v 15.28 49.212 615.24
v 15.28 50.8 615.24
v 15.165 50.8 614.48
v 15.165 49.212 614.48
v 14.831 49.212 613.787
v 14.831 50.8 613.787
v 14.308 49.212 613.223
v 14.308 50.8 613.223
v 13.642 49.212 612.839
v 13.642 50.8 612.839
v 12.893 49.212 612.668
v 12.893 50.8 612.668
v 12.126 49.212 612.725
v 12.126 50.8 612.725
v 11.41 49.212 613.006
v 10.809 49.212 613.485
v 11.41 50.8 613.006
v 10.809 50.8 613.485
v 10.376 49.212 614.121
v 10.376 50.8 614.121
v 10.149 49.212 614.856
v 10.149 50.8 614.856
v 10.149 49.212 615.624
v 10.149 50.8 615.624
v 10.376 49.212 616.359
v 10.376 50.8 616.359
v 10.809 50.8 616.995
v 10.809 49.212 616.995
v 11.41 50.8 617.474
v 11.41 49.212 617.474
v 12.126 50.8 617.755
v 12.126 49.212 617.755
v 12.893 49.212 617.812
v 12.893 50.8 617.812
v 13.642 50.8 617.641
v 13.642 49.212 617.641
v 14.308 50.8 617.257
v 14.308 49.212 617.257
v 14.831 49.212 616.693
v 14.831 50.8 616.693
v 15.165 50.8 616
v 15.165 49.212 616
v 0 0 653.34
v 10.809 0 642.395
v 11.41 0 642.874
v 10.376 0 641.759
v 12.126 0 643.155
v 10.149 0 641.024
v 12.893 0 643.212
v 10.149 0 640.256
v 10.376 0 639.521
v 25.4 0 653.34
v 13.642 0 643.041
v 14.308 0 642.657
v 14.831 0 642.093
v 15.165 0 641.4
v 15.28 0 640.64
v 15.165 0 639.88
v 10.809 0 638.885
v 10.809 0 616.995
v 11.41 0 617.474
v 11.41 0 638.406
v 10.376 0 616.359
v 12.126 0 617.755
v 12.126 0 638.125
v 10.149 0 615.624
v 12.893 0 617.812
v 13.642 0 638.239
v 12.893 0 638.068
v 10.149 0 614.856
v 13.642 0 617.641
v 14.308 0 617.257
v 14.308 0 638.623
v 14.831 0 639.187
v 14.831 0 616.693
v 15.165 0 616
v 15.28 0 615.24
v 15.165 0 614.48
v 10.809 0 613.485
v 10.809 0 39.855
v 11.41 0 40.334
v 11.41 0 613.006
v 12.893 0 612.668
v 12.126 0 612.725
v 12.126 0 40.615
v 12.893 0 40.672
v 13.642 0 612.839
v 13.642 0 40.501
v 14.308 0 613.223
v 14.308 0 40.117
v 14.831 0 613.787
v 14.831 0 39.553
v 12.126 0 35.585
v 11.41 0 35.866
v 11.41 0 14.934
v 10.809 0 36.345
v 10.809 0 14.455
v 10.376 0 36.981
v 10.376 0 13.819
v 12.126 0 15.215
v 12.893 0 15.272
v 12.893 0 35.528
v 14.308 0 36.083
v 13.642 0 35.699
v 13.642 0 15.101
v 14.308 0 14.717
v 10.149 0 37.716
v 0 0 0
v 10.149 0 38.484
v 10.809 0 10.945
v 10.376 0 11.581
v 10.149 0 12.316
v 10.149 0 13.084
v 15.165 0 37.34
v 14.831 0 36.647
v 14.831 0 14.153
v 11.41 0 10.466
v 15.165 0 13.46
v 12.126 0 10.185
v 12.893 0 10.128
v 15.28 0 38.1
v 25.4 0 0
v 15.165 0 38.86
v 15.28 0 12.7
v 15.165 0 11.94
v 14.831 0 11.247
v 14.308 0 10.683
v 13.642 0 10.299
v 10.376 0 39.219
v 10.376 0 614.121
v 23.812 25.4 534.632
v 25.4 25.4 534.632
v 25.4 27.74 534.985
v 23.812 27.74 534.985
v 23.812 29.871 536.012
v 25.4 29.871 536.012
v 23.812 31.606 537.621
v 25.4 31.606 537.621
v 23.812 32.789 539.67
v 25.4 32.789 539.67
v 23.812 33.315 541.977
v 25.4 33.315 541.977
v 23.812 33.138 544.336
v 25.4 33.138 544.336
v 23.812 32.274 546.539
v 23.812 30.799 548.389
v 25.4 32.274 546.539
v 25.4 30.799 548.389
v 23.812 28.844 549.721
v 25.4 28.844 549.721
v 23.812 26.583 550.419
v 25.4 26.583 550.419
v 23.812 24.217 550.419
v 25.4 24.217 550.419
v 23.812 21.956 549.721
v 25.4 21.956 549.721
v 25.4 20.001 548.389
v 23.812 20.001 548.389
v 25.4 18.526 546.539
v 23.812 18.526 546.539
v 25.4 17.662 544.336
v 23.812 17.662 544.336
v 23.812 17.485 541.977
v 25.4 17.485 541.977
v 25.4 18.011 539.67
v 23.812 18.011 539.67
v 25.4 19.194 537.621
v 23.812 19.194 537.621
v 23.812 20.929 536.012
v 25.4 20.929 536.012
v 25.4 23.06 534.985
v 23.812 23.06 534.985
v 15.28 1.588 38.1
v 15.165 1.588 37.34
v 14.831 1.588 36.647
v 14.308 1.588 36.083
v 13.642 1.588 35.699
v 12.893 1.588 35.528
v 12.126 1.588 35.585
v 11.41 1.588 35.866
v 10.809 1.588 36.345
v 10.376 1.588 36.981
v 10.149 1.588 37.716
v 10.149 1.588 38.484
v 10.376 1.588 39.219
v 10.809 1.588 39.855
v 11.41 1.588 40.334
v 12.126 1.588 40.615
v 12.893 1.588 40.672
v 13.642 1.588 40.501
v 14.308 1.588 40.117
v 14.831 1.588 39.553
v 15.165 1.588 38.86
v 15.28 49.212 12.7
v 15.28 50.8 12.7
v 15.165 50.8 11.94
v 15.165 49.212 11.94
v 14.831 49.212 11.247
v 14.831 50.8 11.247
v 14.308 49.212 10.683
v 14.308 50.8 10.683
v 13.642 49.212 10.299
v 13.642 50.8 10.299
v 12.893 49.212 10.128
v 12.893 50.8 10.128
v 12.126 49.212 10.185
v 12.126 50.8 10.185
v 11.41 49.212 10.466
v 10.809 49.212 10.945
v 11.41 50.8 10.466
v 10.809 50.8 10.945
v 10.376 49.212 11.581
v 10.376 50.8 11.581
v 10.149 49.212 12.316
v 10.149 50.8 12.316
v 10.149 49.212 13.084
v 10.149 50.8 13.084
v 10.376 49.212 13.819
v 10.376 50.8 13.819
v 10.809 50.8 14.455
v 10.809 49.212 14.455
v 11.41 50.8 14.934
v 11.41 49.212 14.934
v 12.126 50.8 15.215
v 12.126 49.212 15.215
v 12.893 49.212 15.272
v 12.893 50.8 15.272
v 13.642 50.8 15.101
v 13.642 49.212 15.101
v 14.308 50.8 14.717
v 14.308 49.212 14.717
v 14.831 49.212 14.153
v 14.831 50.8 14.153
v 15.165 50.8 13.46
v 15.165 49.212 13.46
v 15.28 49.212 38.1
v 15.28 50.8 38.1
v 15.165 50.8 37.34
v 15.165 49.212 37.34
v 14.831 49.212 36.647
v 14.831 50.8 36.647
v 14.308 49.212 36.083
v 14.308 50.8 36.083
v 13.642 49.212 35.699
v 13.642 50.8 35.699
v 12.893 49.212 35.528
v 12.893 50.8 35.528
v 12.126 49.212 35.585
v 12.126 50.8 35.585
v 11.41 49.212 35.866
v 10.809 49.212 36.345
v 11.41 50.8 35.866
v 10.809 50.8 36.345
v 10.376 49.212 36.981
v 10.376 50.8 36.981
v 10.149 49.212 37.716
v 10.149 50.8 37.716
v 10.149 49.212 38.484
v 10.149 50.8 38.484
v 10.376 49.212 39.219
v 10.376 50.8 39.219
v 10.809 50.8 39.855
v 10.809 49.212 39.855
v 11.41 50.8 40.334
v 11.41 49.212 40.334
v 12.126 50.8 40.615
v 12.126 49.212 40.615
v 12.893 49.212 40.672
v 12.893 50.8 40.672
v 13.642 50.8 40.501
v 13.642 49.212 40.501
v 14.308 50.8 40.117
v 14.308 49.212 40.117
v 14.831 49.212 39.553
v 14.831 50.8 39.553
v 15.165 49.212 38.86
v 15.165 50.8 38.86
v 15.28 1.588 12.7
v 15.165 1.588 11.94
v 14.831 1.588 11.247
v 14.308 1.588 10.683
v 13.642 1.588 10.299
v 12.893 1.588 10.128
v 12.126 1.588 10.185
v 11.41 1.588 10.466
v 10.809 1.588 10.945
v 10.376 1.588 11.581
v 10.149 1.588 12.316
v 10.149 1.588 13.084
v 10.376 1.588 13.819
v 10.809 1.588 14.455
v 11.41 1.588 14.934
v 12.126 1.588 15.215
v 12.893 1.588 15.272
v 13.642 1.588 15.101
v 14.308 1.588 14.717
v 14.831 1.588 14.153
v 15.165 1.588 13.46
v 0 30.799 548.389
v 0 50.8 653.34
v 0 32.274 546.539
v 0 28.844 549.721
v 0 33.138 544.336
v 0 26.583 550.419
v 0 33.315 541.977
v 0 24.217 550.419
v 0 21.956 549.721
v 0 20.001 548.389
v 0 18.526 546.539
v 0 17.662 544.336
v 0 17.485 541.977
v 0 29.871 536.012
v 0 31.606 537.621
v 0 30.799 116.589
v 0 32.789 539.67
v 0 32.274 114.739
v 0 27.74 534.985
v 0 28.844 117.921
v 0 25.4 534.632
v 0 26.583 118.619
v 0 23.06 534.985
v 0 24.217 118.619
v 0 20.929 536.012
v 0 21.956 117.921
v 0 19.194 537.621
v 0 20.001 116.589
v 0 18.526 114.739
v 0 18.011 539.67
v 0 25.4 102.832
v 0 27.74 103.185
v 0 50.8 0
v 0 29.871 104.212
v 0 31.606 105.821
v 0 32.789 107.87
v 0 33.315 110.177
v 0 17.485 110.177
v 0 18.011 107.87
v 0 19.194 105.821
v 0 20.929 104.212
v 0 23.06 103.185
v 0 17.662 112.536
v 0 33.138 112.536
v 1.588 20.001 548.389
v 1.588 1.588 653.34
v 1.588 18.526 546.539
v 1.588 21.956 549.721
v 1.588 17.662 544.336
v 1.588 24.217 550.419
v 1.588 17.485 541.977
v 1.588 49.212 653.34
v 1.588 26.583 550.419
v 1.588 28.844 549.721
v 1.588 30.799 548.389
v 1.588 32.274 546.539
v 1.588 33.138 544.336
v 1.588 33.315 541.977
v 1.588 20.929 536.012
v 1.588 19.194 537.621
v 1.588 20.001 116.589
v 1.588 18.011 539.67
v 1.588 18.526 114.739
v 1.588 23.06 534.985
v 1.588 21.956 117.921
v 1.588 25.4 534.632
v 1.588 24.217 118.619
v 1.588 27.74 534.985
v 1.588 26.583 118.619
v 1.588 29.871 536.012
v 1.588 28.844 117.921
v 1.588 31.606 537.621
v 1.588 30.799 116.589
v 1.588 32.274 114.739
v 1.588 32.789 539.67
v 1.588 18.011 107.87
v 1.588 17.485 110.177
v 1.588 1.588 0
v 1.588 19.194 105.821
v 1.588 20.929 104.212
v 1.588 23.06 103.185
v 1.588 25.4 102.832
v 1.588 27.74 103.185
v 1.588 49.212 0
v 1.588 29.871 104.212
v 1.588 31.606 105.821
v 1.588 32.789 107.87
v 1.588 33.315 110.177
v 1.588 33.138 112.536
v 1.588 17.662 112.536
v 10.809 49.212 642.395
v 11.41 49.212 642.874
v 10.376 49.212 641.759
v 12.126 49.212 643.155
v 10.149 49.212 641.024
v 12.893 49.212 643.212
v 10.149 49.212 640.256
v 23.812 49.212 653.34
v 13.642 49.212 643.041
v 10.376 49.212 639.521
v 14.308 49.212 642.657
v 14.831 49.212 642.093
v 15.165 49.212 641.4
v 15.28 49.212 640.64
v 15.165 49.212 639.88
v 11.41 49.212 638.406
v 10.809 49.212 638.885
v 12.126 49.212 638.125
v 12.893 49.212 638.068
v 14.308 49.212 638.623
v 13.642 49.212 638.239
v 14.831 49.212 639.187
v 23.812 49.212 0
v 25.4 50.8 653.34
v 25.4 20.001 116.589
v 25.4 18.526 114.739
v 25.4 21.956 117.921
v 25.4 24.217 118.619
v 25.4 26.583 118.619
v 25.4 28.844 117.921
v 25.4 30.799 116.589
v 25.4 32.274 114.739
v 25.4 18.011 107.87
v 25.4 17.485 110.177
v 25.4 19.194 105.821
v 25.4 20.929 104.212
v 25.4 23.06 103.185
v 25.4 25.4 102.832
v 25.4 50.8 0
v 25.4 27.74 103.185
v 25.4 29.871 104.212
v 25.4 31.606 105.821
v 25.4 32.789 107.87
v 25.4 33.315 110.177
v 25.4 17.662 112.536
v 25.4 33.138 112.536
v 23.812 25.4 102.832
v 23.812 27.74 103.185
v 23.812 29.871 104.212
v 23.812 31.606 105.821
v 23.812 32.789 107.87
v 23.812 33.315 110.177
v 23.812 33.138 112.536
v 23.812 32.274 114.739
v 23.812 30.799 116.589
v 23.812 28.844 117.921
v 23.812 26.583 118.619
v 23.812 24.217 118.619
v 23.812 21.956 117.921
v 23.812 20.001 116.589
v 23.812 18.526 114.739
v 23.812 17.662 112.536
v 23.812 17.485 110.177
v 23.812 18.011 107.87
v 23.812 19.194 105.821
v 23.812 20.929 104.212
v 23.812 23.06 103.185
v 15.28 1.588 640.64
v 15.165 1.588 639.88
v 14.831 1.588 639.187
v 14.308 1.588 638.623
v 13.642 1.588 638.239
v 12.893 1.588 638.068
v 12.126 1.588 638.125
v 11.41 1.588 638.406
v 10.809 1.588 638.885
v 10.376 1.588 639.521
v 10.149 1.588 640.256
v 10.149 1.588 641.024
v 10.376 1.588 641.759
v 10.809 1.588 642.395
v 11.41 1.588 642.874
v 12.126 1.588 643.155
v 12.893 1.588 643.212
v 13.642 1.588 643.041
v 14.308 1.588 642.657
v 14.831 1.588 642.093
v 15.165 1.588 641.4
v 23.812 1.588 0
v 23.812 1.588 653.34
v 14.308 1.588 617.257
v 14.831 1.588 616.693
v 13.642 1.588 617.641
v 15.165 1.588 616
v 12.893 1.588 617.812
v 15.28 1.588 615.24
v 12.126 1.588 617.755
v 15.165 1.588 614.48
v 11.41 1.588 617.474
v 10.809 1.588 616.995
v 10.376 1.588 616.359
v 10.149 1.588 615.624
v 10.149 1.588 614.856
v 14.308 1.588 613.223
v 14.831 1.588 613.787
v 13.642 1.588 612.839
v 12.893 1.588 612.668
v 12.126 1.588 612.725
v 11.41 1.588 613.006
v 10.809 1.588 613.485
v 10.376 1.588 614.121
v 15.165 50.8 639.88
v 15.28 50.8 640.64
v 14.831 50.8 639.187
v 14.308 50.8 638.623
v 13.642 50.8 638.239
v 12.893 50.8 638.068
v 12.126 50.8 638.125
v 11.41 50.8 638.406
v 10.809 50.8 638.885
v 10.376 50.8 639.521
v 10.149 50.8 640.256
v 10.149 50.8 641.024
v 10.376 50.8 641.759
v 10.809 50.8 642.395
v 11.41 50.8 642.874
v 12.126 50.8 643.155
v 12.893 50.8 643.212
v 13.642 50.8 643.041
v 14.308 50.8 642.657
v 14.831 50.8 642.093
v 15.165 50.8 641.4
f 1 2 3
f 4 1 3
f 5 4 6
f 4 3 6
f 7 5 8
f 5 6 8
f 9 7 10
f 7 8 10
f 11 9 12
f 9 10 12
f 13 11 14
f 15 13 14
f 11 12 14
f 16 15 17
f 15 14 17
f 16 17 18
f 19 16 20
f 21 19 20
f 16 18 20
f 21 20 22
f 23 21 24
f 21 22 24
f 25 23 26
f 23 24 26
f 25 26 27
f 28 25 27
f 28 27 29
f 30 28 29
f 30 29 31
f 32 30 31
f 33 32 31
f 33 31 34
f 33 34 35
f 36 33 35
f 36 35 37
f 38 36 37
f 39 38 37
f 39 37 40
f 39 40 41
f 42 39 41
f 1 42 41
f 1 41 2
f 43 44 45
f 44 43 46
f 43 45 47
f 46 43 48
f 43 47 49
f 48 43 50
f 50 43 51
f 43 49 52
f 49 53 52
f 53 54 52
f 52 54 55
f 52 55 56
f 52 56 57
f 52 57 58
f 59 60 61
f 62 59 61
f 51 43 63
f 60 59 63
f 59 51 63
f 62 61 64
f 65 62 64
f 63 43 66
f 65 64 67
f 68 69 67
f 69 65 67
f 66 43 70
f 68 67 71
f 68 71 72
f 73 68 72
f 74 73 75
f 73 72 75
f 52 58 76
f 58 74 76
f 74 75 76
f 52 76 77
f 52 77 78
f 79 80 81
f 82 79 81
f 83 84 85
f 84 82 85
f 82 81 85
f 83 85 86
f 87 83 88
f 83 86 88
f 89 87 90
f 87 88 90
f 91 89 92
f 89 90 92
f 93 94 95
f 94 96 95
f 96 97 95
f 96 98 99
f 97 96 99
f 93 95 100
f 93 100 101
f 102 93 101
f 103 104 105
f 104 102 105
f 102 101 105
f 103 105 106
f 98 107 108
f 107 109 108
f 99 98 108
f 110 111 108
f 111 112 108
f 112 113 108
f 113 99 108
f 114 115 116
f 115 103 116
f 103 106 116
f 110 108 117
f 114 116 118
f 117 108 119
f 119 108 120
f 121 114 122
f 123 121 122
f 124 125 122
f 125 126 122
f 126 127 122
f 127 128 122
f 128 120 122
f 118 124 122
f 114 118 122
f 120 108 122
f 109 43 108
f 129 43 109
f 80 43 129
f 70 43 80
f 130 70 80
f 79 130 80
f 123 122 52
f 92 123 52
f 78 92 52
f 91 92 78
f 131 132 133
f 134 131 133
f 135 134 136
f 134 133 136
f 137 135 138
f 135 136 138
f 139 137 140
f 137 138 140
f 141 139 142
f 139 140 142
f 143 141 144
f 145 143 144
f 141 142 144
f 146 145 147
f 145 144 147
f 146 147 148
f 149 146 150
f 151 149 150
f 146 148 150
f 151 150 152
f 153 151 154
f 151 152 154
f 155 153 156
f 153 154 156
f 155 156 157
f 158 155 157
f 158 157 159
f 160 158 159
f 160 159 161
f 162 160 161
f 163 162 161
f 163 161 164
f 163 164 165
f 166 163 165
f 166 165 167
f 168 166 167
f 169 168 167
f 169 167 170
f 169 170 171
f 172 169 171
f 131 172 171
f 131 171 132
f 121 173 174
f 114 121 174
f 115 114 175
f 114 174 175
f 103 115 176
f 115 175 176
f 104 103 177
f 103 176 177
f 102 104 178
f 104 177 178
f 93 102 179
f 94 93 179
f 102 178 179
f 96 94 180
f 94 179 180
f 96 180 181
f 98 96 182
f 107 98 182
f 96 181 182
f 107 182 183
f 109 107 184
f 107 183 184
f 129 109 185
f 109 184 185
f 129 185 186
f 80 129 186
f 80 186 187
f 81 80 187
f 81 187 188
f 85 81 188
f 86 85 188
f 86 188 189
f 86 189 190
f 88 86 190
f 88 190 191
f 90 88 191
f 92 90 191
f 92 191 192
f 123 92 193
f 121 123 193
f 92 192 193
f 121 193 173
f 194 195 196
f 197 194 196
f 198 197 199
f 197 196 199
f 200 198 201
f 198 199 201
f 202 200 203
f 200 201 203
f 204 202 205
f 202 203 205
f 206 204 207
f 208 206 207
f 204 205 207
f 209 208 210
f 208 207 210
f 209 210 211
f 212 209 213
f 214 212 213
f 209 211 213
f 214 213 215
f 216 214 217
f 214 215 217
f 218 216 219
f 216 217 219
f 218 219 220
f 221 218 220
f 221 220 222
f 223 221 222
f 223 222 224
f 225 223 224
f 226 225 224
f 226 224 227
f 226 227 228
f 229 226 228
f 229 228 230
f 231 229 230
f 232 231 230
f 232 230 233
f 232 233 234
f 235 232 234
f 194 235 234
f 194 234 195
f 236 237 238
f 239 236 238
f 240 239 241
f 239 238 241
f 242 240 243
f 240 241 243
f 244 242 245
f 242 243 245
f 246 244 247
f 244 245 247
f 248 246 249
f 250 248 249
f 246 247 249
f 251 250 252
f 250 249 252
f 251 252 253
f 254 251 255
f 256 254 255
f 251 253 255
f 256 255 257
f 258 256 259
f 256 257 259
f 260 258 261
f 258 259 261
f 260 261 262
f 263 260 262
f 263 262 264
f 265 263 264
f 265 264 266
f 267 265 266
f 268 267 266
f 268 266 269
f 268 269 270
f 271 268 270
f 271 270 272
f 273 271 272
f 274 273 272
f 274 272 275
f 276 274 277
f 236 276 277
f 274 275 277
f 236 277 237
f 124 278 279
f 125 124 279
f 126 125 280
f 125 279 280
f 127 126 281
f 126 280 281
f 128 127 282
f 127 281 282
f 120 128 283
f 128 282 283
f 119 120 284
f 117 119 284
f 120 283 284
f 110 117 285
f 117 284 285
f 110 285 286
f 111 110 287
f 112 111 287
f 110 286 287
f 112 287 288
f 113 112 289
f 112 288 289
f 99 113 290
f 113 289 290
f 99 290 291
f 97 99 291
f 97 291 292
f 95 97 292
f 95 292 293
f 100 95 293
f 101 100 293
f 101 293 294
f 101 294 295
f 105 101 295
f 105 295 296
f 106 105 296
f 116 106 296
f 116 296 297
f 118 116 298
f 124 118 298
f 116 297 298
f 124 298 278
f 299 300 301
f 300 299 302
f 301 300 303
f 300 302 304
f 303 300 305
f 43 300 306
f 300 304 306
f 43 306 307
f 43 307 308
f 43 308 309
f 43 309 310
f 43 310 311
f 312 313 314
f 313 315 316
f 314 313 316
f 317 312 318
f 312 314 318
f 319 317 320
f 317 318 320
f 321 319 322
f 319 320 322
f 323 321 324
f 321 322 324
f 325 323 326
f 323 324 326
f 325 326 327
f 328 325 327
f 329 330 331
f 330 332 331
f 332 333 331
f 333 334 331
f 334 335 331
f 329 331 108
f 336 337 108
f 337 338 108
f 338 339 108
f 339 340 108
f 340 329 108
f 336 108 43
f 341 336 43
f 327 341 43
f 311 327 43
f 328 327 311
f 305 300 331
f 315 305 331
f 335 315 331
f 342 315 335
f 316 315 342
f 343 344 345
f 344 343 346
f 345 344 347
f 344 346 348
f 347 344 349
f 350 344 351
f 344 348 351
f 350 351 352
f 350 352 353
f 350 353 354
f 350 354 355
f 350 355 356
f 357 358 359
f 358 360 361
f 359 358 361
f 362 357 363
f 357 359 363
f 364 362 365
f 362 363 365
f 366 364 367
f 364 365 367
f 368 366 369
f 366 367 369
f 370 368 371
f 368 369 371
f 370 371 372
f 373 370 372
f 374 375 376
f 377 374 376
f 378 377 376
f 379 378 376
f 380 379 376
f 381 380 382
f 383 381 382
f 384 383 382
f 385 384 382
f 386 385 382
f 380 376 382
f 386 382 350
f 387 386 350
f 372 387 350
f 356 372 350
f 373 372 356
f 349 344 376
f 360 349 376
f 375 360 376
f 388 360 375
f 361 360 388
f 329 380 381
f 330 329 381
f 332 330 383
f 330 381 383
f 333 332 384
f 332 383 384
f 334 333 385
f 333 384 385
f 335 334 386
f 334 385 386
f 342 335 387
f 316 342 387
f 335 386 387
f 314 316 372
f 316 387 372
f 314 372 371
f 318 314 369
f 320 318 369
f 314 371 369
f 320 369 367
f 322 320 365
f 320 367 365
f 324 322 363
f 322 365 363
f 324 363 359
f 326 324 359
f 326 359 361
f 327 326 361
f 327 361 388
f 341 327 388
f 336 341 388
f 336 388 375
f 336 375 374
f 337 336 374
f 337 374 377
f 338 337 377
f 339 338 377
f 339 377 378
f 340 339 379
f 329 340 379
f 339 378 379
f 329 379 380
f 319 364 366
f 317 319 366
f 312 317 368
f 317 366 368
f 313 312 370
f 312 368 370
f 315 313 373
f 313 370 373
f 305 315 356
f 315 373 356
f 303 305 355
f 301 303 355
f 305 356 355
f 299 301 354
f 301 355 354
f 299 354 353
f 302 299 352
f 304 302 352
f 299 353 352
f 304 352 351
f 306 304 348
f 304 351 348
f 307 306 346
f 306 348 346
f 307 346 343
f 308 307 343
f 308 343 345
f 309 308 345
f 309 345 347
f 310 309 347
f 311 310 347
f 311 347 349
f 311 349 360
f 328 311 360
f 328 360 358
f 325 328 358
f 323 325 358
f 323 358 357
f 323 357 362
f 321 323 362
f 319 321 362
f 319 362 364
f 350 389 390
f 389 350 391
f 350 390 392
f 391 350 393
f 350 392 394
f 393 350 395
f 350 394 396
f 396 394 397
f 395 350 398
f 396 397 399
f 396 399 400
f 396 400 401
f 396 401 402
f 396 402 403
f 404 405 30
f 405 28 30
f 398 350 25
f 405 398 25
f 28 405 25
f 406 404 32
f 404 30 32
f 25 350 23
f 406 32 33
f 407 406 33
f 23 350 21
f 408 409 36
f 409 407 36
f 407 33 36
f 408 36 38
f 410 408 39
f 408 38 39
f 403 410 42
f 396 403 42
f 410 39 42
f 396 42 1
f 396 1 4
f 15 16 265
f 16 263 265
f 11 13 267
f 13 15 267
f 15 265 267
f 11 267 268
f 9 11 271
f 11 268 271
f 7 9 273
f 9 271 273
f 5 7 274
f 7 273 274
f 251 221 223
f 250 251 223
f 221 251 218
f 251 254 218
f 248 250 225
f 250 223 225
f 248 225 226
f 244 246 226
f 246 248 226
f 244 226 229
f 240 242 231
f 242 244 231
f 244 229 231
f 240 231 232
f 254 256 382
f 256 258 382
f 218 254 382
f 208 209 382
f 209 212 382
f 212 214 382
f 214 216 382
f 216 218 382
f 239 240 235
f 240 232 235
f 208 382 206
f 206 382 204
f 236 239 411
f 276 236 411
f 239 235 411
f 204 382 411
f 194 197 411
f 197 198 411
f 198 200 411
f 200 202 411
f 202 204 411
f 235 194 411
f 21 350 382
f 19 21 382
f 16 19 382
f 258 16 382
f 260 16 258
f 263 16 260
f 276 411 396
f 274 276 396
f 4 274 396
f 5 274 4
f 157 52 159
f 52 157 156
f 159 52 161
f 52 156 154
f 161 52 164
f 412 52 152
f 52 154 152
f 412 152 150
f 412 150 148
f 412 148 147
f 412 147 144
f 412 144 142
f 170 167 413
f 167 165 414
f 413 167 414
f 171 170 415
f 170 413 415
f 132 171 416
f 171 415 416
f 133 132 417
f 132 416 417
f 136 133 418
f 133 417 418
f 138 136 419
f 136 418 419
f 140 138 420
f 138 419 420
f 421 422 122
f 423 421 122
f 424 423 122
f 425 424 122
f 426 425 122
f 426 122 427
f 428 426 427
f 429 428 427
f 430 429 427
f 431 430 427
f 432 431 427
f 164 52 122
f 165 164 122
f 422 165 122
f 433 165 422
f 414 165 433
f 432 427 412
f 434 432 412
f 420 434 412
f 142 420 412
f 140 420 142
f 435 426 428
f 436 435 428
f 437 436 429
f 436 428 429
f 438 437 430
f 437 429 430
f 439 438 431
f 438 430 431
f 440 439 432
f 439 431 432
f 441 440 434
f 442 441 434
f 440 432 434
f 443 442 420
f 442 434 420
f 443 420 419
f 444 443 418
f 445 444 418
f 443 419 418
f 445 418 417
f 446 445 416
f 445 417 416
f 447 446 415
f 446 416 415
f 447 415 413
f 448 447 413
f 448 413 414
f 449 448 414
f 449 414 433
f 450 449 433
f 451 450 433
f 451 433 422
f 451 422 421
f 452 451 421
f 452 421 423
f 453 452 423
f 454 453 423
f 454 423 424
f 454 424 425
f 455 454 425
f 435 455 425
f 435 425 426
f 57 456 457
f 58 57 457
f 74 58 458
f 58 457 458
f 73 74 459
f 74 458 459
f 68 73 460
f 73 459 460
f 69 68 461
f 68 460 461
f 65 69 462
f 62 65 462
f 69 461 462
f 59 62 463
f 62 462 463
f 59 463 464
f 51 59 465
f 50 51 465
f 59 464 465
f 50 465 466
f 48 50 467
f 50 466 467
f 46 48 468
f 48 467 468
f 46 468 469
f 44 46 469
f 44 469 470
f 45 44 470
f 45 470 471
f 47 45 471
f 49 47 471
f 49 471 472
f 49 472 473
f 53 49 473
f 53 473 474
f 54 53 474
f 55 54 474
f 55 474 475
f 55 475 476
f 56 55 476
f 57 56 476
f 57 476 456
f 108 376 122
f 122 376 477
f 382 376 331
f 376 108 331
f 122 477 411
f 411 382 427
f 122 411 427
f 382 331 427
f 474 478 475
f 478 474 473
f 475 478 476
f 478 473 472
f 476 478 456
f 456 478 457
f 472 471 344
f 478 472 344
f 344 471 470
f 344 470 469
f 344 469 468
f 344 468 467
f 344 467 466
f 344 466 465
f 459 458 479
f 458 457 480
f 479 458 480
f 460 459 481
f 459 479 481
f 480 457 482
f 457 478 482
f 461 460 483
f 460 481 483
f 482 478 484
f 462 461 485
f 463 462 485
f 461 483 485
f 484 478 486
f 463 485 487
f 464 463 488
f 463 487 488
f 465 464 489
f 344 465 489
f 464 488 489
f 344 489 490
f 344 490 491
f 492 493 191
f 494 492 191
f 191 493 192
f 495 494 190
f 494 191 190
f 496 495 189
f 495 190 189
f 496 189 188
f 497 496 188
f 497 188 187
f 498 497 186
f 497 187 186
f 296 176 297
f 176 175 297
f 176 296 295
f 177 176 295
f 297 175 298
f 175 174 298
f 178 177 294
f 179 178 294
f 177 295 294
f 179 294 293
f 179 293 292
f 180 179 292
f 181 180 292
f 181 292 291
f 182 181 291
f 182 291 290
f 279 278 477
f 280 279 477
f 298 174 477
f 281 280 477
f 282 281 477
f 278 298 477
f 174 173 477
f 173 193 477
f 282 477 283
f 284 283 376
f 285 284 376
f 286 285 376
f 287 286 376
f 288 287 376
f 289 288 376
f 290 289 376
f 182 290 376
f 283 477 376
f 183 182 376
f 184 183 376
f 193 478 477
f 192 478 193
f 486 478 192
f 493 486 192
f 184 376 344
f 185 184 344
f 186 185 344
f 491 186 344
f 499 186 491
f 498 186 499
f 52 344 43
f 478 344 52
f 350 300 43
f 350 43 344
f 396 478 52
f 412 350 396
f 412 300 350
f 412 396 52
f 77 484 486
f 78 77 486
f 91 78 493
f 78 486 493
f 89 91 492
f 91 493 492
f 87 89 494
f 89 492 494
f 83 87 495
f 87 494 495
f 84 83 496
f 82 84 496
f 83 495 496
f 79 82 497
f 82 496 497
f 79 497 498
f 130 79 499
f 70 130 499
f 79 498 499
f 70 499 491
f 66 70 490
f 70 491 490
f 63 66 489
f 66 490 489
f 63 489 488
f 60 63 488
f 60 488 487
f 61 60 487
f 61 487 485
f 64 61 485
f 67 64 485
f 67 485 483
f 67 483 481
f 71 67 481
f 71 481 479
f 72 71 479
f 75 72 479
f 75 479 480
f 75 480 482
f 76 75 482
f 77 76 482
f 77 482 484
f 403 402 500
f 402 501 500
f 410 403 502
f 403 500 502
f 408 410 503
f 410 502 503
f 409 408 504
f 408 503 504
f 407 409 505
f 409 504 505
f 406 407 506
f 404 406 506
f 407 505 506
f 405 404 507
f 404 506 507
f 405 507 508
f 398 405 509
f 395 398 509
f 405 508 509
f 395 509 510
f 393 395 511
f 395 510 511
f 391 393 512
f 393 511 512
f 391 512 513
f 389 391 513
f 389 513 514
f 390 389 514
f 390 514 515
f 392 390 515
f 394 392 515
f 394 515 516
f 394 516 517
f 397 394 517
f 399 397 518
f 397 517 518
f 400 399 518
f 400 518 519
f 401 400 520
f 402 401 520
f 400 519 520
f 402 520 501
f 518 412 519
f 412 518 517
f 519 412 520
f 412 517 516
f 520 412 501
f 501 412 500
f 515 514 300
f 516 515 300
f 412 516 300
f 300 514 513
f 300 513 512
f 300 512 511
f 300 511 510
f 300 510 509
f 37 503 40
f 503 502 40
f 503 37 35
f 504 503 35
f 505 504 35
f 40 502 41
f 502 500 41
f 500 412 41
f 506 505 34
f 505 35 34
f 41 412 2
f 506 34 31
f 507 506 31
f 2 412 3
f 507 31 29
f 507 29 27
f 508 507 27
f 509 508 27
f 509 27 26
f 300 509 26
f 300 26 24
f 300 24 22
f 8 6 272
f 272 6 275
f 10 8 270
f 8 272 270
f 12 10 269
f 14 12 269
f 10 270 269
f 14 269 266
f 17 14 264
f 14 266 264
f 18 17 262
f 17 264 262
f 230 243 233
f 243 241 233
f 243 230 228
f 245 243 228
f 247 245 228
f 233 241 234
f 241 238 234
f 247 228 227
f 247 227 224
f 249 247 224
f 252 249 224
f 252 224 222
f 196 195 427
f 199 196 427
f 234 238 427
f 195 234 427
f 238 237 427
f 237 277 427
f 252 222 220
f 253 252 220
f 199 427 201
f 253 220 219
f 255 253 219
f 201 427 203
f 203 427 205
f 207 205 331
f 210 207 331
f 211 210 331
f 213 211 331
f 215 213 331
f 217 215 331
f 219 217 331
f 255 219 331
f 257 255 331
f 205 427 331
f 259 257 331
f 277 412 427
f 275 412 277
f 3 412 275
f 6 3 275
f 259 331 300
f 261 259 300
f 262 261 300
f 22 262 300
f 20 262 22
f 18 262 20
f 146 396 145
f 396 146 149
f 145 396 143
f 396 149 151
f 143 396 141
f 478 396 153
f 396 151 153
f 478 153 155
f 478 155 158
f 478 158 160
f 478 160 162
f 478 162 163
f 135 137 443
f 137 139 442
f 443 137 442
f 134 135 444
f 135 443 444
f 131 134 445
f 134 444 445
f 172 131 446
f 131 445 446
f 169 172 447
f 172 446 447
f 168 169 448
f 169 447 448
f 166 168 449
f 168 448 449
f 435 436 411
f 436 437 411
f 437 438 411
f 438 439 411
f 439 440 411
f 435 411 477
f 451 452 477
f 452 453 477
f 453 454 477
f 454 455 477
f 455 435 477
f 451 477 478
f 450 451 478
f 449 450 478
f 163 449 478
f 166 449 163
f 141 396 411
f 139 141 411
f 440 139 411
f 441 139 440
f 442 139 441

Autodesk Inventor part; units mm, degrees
ref_plane "YZ Plane" through (0, 0, 0) normal (1, 0, 0) x (0, 1, 0)
ref_plane "XZ Plane" through (0, 0, 0) normal (0, 1, 0) x (-1, 0, 0)
ref_plane "XY Plane" through (0, 0, 0) normal (0, 0, 1) x (1, 0, 0)
sketch "Sketch1" plane through (0, 0, 0) normal (0, 0, 1) x (1, 0, 0)
  line L0 (0, 0) -> (25.4, 0)
  line L1 (25.4, 0) -> (25.4, 50.8)
  line L2 (25.4, 50.8) -> (0, 50.8)
  line L3 (0, 50.8) -> (0, 0)
  line L4 (1.5875, 49.2125) -> (23.8125, 49.2125)
  line L5 (23.8125, 49.2125) -> (23.8125, 1.5875)
  line L6 (23.8125, 1.5875) -> (1.5875, 1.5875)
  line L7 (1.5875, 1.5875) -> (1.5875, 49.2125)
  dimension "d0" = 25.4
  dimension "d1" = 50.8
  dimension "d2" = 1.5875
extrude "Extrusion1" add sketch "Sketch1" along normal blind 653.34
sketch "Sketch2" plane through (0, 50.8, 0) normal (0, 1, 0) x (1, 0, 0)
  line L0 (25.4, 0) -> (0, 0) construction
  line L1 (12.7, 0) -> (12.7, -12.7) construction
  line L2 (12.7, -12.7) -> (12.7, -38.1) construction
  line L3 (0, -653.34) -> (25.4, -653.34) construction
  line L4 (12.7, -653.34) -> (12.7, -640.64) construction
  line L5 (12.7, -640.64) -> (12.7, -615.24) construction
  circle A0 centre (12.7, -640.64) radius 2.5797
  circle A1 centre (12.7, -615.24) radius 2.5797
  circle A2 centre (12.7, -38.1) radius 2.5797
  circle A3 centre (12.7, -12.7) radius 2.5797
  dimension "d5" = 12.7
  dimension "d6" = 25.4
  dimension "d7" = 12.7
  dimension "d8" = 25.4
  dimension "d9" = 5.1594
extrude "Extrusion2" cut sketch "Sketch2" against normal blind 653.34
sketch "Sketch3" plane through (25.4, 0, 0) normal (1, 0, 0) x (0, 0, -1)
  line L0 (0, 50.8) -> (-653.34, 50.8) construction
  line L1 (-326.67, 50.8) -> (-326.67, 0) construction
  line L2 (0, 0) -> (-653.34, 0) construction
  line L3 (0, 49.2125) -> (0, 1.5875) construction
  line L4 (0, 25.4) -> (-110.77, 25.4) construction
  circle A0 centre (-110.77, 25.4) radius 7.9375
  circle A1 centre (-542.57, 25.4) radius 7.9375
  dimension "d12" = 110.77
  dimension "d13" = 15.875
extrude "Extrusion3" cut sketch "Sketch3" against normal blind 653.34
properties part number "1x2 piston attachment"
